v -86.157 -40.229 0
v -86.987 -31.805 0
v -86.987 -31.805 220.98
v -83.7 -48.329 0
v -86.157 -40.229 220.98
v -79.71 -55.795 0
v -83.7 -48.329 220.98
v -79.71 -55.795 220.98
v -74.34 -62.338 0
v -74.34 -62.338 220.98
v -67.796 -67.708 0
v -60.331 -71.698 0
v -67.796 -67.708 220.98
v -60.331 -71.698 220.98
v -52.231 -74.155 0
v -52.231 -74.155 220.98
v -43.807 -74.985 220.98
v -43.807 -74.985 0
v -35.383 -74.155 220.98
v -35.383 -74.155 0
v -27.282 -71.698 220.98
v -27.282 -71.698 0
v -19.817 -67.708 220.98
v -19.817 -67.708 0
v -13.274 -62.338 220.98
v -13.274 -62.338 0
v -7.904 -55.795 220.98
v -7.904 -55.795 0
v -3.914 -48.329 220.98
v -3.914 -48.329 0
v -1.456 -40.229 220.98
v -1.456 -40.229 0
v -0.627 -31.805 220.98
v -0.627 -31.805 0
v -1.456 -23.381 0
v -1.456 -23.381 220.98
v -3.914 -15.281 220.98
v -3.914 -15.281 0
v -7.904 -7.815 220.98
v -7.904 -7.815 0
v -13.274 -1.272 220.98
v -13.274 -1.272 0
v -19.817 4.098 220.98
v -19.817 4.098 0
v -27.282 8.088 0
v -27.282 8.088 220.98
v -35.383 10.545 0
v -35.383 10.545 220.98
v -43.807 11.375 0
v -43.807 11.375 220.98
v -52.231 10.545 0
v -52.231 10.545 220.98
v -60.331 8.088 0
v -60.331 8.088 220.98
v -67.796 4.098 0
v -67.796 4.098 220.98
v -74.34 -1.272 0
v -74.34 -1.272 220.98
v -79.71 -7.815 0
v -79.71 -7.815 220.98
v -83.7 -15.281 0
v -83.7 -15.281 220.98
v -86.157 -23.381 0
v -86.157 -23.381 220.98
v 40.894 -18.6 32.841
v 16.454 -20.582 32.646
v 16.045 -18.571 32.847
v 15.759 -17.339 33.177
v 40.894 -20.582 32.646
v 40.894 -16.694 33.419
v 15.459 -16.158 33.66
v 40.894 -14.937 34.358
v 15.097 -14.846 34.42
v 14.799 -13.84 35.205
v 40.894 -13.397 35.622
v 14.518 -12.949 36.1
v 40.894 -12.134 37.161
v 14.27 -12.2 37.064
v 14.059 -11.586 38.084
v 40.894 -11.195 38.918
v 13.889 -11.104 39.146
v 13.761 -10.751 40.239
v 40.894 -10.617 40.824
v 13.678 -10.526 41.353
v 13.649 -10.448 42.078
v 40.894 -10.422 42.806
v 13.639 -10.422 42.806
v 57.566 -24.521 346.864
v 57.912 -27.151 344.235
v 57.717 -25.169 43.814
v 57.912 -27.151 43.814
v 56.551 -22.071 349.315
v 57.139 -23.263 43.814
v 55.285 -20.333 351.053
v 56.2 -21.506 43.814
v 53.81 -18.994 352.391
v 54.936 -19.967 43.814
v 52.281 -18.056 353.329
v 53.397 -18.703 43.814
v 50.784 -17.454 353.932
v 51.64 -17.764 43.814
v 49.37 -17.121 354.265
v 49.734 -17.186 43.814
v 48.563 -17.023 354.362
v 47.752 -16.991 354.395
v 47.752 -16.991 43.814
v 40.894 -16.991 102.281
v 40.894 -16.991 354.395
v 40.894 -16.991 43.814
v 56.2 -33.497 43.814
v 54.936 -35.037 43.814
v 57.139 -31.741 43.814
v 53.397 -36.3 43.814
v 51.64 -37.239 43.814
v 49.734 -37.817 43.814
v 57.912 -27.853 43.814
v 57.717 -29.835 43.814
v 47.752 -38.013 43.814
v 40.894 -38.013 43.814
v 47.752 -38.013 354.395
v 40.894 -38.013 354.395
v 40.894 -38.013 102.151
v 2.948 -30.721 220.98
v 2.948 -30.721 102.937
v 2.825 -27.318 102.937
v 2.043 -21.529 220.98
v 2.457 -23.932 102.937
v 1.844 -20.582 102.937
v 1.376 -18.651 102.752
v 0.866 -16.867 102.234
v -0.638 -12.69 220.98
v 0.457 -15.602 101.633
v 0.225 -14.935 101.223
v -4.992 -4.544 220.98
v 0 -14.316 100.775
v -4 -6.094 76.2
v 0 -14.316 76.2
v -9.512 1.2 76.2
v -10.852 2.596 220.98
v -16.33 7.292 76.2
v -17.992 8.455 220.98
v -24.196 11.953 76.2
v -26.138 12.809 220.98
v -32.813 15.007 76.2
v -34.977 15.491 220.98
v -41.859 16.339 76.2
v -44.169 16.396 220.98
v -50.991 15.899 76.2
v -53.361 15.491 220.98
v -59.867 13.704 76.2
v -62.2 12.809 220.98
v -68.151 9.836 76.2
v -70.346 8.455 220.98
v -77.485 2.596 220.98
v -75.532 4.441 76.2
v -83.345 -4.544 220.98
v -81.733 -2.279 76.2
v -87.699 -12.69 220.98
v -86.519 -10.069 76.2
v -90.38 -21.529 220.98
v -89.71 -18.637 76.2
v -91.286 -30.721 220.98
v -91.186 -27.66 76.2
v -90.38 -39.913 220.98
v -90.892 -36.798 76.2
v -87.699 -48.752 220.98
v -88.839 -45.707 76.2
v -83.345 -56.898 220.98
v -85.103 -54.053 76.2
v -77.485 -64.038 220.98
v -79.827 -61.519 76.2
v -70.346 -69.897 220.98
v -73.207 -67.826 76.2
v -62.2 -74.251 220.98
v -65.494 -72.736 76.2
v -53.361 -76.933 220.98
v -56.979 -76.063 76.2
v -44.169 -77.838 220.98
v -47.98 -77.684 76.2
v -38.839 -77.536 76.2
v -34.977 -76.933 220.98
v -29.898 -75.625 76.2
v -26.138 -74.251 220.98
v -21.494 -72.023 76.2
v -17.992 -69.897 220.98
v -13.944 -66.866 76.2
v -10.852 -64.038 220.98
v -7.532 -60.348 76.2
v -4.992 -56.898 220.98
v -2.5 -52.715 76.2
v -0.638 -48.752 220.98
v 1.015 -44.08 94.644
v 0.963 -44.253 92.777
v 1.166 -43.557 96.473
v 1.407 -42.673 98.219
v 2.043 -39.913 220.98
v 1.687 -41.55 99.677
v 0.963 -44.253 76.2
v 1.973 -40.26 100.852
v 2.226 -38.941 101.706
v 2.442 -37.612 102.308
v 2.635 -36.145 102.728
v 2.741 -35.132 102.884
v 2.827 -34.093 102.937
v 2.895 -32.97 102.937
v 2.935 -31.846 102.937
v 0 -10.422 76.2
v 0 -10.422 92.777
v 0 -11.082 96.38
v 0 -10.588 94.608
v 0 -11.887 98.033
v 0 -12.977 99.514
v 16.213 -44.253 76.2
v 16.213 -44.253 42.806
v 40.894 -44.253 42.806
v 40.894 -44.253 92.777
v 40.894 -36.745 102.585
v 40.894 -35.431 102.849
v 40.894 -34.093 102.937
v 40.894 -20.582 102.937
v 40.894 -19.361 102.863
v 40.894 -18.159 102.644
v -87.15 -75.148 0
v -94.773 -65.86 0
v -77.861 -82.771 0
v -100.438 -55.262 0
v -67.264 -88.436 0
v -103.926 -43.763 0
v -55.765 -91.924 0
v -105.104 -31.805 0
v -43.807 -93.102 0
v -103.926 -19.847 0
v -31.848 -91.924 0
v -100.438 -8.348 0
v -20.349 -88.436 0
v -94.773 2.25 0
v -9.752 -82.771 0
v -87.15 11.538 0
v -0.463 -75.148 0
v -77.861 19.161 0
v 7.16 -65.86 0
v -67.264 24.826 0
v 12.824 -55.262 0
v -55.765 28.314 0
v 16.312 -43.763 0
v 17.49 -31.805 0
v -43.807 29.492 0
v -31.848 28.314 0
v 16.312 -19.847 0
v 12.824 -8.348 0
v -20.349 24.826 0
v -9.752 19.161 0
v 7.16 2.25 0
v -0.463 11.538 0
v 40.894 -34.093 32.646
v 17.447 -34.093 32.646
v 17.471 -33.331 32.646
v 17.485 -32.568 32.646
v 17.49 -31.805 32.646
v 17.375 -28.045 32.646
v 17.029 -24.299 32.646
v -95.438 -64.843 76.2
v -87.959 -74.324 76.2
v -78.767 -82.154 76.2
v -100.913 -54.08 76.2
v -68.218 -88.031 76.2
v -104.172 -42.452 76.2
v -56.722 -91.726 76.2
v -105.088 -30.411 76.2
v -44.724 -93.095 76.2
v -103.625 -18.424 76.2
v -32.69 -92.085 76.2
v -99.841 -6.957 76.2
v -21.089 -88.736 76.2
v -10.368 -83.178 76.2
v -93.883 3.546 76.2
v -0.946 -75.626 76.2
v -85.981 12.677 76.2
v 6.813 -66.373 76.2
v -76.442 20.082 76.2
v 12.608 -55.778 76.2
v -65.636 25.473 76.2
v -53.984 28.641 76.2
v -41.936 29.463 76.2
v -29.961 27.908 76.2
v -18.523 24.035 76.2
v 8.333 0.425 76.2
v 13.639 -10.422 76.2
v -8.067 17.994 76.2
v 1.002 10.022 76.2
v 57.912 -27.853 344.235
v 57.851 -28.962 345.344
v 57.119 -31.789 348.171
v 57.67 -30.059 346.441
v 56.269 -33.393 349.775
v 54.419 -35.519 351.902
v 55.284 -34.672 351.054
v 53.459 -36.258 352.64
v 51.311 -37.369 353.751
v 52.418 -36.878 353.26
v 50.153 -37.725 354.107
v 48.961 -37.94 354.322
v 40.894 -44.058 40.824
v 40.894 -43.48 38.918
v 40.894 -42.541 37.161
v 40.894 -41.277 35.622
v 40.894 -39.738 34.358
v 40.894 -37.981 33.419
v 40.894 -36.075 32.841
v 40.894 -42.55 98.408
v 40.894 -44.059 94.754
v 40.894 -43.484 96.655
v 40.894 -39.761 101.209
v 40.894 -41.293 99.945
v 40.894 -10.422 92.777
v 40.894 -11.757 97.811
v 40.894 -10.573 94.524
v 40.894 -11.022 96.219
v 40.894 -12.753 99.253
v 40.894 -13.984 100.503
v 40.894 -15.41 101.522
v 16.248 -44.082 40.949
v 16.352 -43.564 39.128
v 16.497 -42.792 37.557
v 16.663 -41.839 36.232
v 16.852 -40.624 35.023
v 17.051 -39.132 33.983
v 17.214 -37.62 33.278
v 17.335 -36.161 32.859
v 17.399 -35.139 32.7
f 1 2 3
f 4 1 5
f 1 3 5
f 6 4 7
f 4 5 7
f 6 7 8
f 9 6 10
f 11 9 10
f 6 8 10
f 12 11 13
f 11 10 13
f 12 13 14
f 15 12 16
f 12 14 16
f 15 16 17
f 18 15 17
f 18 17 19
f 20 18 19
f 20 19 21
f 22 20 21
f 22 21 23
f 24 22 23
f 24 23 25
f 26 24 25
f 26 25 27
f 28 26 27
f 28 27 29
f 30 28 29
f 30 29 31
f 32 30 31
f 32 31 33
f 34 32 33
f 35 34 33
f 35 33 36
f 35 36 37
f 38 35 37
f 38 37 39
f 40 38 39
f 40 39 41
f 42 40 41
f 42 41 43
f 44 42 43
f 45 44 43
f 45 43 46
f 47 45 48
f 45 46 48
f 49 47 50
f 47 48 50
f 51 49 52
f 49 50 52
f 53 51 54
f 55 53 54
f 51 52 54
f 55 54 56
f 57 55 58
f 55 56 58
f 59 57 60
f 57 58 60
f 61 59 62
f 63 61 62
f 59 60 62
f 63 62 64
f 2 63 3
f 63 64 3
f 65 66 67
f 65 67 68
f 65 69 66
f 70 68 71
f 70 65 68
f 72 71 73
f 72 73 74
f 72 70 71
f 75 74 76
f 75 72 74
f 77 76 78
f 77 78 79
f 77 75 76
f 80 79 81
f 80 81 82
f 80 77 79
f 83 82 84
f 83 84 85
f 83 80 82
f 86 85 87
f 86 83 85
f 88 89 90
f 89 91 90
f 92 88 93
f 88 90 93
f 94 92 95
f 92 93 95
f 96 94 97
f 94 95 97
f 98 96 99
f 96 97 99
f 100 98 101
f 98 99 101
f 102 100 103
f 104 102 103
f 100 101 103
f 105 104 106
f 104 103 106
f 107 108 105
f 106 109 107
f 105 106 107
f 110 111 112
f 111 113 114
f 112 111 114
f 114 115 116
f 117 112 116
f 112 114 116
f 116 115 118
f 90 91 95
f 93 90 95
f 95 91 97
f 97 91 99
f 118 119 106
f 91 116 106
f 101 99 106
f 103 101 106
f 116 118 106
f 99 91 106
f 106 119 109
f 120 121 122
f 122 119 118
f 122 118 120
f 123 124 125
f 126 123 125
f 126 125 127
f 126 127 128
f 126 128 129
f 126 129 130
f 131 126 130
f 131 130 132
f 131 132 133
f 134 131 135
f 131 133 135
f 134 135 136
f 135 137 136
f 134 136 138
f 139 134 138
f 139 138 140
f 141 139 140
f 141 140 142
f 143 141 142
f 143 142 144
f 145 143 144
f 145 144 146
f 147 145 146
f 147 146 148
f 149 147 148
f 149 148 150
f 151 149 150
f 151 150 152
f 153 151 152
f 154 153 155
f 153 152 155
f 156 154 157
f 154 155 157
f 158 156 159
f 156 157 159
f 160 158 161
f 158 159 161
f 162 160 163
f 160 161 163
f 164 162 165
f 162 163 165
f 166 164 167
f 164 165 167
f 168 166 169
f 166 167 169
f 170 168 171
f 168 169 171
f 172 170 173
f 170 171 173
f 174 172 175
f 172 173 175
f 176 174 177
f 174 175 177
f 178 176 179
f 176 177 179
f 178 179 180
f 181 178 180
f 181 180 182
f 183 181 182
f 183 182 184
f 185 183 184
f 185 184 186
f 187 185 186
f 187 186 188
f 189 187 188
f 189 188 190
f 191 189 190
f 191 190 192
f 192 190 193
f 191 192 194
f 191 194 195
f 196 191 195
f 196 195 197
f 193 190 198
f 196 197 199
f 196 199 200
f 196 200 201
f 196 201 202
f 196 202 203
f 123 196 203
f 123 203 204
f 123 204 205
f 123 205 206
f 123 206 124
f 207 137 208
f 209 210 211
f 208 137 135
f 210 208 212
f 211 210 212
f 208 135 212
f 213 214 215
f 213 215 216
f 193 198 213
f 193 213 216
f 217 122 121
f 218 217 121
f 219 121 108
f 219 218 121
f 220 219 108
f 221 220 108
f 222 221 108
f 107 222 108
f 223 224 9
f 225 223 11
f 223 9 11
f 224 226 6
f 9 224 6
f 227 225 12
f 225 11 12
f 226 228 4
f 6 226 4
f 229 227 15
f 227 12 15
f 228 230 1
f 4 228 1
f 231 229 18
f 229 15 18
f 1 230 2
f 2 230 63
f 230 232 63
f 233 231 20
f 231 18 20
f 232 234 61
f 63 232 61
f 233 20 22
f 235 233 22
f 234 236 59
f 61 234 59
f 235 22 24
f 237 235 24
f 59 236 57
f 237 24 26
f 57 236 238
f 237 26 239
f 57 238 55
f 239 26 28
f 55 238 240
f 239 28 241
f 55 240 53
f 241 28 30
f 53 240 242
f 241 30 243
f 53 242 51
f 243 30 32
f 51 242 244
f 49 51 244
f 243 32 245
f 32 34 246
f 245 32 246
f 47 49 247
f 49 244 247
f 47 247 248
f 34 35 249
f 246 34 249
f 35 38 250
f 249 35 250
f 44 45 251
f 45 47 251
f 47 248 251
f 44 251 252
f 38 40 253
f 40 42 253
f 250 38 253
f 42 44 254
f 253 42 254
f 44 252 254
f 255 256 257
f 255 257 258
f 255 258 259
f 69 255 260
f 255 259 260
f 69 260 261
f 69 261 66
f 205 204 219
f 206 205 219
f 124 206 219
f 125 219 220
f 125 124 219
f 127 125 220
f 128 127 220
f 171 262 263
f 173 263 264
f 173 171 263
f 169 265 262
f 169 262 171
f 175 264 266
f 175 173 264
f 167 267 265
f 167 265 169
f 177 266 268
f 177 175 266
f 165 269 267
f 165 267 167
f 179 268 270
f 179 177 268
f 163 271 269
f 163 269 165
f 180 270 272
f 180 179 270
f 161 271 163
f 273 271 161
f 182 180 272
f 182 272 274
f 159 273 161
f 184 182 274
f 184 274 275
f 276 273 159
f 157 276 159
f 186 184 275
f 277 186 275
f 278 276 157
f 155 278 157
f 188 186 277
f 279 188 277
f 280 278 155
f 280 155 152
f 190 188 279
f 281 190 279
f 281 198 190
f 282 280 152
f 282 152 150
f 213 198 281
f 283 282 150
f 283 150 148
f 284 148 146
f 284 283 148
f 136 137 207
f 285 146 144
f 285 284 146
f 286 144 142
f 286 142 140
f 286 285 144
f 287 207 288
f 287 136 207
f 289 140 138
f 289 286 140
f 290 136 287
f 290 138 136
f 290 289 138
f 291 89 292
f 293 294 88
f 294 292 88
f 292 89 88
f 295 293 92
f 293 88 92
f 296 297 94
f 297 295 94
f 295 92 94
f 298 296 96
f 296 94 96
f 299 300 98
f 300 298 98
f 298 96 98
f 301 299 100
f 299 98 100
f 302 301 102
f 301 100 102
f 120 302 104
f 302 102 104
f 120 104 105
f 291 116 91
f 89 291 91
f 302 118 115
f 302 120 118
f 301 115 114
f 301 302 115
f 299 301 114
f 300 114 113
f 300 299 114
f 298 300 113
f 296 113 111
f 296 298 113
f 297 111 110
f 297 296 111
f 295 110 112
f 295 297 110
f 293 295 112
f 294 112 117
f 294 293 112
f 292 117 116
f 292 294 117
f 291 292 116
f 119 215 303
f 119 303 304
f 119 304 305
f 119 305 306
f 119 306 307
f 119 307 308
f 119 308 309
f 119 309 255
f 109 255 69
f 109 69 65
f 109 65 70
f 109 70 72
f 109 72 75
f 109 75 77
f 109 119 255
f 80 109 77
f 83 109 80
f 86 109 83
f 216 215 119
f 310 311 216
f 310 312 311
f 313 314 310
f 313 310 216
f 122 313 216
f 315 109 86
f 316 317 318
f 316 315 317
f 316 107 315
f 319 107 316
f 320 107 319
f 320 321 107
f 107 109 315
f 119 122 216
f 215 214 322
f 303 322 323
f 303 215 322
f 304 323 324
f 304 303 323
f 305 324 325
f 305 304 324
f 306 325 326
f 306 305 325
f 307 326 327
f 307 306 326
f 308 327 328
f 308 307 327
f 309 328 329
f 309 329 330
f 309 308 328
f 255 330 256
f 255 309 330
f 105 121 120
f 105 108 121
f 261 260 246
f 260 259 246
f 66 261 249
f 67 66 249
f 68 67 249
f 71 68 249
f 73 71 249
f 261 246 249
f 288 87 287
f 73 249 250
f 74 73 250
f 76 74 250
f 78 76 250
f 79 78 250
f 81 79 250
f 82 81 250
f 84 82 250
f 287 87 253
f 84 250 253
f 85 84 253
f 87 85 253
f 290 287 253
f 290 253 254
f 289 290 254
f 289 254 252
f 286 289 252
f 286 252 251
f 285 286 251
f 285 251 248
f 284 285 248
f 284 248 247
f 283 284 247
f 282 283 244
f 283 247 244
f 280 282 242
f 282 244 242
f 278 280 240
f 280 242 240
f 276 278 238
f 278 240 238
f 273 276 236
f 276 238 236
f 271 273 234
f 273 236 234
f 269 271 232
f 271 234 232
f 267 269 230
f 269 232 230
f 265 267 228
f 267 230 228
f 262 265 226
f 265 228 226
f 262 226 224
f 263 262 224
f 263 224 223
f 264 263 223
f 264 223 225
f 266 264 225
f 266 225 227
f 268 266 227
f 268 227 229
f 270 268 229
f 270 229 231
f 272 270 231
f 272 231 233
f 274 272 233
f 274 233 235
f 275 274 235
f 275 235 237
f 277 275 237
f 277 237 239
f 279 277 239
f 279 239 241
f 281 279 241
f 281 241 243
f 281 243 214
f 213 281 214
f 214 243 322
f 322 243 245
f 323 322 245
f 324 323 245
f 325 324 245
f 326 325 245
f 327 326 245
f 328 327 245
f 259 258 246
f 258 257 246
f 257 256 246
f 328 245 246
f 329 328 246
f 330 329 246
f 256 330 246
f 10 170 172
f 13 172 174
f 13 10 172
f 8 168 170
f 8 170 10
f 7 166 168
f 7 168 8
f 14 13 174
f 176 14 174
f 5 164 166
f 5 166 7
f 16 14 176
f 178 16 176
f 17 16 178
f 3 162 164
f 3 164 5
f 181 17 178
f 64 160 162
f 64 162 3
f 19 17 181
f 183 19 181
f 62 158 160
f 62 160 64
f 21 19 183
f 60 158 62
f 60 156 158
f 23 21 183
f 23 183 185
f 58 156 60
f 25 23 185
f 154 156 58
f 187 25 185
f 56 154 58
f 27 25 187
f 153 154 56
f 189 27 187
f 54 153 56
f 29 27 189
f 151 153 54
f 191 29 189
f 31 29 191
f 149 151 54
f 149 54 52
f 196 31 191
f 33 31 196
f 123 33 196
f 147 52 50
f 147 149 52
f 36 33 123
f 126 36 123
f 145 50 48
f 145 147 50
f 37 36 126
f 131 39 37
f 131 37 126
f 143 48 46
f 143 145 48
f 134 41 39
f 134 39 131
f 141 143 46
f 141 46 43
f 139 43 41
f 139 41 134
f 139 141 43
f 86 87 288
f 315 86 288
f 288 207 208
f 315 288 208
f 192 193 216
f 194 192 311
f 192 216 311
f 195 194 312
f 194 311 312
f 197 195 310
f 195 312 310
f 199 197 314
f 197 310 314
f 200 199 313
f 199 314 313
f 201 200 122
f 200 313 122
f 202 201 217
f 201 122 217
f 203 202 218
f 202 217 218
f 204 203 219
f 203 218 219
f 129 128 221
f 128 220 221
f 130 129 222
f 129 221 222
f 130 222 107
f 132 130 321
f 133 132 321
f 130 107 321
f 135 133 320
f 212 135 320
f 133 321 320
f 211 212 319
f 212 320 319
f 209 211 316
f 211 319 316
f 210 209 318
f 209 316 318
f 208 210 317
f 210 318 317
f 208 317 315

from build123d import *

# Parameters (mm, degrees)
F0_R      = 47.117
F1_DEPTH  = 220.98
F3_D      = 78.74
F4_R      = 61.2968374211
F5_DEPTH  = 76.2
F7_D      = 86.36
F8_W      = 33.8315991685
F8_H      = 70.290889591
F9_DEPTH  = 40.894
F10_R     = 10.16
F11_W     = 21.0215765983
F11_H     = 1.9707717001
F12_DEPTH = 17.018
F13_W     = 17.018
F13_H     = 21.0215765983
F14_DEPTH = 308.61
F15_R     = 10.16


with BuildPart() as f1:
    # F0 (on Top) → F1 (new body)
    with BuildSketch(Plane.XY):
        with Locations((-44.1687442362, -30.721032992)):
            Circle(F0_R)
    extrude(amount=F1_DEPTH)

    # F3 (through all)
    with Locations(Plane(origin=(0, 0, 0), x_dir=(1, 0, 0), z_dir=(0, 0, -1))):
        with Locations((-44.1687442362, 30.721032992)):
            Hole(F3_D / 2)

    # F4 (on Top) → F5 (join)
    with BuildSketch(Plane.XY):
        with Locations((-43.806668371, -31.8049825728)):
            Circle(F4_R)
    extrude(amount=F5_DEPTH)

    # F7 (through all)
    with Locations(Plane(origin=(0, 0, 0), x_dir=(1, 0, 0), z_dir=(0, 0, -1))):
        with Locations((-43.806668371, 31.8049825728)):
            Hole(F7_D / 2)

    # F8 (on Right) → F9 (join)
    with BuildSketch(Plane.YZ):
        with Locations((-27.3374826647, 67.7915308625)):
            Rectangle(F8_W, F8_H)
    extrude(amount=F9_DEPTH)

    # F10
    f10_edges = [f1.edges().sort_by_distance(p)[0] for p in [
        (20.447, -10.421683, 102.936976),
        (20.928586, -44.253282, 102.936976),
        (27.266726, -10.421683, 32.646086),
        (28.553423, -44.253282, 32.646086),
    ]]
    fillet(f10_edges, radius=F10_R)

    # F11 (on face) → F12 (join)
    with BuildSketch(Plane.YZ.offset(40.894)):
        with Locations((-27.5017125532, 44.7991844267)):
            Rectangle(F11_W, F11_H)
    extrude(amount=F12_DEPTH)

    # F13 (on face) → F14 (join)
    with BuildSketch(Plane.XY.offset(45.7845702767)):
        with Locations((49.403, -27.5017125532)):
            Rectangle(F13_W, F13_H)
    extrude(amount=F14_DEPTH)

    # F15
    f15_edges = [f1.edges().sort_by_distance(p)[0] for p in [
        (57.912, -38.012501, 199.104184),
        (57.912, -16.990924, 199.104184),
        (57.912, -27.501713, 354.39457),
    ]]
    fillet(f15_edges, radius=F15_R)


solid = f1.part
